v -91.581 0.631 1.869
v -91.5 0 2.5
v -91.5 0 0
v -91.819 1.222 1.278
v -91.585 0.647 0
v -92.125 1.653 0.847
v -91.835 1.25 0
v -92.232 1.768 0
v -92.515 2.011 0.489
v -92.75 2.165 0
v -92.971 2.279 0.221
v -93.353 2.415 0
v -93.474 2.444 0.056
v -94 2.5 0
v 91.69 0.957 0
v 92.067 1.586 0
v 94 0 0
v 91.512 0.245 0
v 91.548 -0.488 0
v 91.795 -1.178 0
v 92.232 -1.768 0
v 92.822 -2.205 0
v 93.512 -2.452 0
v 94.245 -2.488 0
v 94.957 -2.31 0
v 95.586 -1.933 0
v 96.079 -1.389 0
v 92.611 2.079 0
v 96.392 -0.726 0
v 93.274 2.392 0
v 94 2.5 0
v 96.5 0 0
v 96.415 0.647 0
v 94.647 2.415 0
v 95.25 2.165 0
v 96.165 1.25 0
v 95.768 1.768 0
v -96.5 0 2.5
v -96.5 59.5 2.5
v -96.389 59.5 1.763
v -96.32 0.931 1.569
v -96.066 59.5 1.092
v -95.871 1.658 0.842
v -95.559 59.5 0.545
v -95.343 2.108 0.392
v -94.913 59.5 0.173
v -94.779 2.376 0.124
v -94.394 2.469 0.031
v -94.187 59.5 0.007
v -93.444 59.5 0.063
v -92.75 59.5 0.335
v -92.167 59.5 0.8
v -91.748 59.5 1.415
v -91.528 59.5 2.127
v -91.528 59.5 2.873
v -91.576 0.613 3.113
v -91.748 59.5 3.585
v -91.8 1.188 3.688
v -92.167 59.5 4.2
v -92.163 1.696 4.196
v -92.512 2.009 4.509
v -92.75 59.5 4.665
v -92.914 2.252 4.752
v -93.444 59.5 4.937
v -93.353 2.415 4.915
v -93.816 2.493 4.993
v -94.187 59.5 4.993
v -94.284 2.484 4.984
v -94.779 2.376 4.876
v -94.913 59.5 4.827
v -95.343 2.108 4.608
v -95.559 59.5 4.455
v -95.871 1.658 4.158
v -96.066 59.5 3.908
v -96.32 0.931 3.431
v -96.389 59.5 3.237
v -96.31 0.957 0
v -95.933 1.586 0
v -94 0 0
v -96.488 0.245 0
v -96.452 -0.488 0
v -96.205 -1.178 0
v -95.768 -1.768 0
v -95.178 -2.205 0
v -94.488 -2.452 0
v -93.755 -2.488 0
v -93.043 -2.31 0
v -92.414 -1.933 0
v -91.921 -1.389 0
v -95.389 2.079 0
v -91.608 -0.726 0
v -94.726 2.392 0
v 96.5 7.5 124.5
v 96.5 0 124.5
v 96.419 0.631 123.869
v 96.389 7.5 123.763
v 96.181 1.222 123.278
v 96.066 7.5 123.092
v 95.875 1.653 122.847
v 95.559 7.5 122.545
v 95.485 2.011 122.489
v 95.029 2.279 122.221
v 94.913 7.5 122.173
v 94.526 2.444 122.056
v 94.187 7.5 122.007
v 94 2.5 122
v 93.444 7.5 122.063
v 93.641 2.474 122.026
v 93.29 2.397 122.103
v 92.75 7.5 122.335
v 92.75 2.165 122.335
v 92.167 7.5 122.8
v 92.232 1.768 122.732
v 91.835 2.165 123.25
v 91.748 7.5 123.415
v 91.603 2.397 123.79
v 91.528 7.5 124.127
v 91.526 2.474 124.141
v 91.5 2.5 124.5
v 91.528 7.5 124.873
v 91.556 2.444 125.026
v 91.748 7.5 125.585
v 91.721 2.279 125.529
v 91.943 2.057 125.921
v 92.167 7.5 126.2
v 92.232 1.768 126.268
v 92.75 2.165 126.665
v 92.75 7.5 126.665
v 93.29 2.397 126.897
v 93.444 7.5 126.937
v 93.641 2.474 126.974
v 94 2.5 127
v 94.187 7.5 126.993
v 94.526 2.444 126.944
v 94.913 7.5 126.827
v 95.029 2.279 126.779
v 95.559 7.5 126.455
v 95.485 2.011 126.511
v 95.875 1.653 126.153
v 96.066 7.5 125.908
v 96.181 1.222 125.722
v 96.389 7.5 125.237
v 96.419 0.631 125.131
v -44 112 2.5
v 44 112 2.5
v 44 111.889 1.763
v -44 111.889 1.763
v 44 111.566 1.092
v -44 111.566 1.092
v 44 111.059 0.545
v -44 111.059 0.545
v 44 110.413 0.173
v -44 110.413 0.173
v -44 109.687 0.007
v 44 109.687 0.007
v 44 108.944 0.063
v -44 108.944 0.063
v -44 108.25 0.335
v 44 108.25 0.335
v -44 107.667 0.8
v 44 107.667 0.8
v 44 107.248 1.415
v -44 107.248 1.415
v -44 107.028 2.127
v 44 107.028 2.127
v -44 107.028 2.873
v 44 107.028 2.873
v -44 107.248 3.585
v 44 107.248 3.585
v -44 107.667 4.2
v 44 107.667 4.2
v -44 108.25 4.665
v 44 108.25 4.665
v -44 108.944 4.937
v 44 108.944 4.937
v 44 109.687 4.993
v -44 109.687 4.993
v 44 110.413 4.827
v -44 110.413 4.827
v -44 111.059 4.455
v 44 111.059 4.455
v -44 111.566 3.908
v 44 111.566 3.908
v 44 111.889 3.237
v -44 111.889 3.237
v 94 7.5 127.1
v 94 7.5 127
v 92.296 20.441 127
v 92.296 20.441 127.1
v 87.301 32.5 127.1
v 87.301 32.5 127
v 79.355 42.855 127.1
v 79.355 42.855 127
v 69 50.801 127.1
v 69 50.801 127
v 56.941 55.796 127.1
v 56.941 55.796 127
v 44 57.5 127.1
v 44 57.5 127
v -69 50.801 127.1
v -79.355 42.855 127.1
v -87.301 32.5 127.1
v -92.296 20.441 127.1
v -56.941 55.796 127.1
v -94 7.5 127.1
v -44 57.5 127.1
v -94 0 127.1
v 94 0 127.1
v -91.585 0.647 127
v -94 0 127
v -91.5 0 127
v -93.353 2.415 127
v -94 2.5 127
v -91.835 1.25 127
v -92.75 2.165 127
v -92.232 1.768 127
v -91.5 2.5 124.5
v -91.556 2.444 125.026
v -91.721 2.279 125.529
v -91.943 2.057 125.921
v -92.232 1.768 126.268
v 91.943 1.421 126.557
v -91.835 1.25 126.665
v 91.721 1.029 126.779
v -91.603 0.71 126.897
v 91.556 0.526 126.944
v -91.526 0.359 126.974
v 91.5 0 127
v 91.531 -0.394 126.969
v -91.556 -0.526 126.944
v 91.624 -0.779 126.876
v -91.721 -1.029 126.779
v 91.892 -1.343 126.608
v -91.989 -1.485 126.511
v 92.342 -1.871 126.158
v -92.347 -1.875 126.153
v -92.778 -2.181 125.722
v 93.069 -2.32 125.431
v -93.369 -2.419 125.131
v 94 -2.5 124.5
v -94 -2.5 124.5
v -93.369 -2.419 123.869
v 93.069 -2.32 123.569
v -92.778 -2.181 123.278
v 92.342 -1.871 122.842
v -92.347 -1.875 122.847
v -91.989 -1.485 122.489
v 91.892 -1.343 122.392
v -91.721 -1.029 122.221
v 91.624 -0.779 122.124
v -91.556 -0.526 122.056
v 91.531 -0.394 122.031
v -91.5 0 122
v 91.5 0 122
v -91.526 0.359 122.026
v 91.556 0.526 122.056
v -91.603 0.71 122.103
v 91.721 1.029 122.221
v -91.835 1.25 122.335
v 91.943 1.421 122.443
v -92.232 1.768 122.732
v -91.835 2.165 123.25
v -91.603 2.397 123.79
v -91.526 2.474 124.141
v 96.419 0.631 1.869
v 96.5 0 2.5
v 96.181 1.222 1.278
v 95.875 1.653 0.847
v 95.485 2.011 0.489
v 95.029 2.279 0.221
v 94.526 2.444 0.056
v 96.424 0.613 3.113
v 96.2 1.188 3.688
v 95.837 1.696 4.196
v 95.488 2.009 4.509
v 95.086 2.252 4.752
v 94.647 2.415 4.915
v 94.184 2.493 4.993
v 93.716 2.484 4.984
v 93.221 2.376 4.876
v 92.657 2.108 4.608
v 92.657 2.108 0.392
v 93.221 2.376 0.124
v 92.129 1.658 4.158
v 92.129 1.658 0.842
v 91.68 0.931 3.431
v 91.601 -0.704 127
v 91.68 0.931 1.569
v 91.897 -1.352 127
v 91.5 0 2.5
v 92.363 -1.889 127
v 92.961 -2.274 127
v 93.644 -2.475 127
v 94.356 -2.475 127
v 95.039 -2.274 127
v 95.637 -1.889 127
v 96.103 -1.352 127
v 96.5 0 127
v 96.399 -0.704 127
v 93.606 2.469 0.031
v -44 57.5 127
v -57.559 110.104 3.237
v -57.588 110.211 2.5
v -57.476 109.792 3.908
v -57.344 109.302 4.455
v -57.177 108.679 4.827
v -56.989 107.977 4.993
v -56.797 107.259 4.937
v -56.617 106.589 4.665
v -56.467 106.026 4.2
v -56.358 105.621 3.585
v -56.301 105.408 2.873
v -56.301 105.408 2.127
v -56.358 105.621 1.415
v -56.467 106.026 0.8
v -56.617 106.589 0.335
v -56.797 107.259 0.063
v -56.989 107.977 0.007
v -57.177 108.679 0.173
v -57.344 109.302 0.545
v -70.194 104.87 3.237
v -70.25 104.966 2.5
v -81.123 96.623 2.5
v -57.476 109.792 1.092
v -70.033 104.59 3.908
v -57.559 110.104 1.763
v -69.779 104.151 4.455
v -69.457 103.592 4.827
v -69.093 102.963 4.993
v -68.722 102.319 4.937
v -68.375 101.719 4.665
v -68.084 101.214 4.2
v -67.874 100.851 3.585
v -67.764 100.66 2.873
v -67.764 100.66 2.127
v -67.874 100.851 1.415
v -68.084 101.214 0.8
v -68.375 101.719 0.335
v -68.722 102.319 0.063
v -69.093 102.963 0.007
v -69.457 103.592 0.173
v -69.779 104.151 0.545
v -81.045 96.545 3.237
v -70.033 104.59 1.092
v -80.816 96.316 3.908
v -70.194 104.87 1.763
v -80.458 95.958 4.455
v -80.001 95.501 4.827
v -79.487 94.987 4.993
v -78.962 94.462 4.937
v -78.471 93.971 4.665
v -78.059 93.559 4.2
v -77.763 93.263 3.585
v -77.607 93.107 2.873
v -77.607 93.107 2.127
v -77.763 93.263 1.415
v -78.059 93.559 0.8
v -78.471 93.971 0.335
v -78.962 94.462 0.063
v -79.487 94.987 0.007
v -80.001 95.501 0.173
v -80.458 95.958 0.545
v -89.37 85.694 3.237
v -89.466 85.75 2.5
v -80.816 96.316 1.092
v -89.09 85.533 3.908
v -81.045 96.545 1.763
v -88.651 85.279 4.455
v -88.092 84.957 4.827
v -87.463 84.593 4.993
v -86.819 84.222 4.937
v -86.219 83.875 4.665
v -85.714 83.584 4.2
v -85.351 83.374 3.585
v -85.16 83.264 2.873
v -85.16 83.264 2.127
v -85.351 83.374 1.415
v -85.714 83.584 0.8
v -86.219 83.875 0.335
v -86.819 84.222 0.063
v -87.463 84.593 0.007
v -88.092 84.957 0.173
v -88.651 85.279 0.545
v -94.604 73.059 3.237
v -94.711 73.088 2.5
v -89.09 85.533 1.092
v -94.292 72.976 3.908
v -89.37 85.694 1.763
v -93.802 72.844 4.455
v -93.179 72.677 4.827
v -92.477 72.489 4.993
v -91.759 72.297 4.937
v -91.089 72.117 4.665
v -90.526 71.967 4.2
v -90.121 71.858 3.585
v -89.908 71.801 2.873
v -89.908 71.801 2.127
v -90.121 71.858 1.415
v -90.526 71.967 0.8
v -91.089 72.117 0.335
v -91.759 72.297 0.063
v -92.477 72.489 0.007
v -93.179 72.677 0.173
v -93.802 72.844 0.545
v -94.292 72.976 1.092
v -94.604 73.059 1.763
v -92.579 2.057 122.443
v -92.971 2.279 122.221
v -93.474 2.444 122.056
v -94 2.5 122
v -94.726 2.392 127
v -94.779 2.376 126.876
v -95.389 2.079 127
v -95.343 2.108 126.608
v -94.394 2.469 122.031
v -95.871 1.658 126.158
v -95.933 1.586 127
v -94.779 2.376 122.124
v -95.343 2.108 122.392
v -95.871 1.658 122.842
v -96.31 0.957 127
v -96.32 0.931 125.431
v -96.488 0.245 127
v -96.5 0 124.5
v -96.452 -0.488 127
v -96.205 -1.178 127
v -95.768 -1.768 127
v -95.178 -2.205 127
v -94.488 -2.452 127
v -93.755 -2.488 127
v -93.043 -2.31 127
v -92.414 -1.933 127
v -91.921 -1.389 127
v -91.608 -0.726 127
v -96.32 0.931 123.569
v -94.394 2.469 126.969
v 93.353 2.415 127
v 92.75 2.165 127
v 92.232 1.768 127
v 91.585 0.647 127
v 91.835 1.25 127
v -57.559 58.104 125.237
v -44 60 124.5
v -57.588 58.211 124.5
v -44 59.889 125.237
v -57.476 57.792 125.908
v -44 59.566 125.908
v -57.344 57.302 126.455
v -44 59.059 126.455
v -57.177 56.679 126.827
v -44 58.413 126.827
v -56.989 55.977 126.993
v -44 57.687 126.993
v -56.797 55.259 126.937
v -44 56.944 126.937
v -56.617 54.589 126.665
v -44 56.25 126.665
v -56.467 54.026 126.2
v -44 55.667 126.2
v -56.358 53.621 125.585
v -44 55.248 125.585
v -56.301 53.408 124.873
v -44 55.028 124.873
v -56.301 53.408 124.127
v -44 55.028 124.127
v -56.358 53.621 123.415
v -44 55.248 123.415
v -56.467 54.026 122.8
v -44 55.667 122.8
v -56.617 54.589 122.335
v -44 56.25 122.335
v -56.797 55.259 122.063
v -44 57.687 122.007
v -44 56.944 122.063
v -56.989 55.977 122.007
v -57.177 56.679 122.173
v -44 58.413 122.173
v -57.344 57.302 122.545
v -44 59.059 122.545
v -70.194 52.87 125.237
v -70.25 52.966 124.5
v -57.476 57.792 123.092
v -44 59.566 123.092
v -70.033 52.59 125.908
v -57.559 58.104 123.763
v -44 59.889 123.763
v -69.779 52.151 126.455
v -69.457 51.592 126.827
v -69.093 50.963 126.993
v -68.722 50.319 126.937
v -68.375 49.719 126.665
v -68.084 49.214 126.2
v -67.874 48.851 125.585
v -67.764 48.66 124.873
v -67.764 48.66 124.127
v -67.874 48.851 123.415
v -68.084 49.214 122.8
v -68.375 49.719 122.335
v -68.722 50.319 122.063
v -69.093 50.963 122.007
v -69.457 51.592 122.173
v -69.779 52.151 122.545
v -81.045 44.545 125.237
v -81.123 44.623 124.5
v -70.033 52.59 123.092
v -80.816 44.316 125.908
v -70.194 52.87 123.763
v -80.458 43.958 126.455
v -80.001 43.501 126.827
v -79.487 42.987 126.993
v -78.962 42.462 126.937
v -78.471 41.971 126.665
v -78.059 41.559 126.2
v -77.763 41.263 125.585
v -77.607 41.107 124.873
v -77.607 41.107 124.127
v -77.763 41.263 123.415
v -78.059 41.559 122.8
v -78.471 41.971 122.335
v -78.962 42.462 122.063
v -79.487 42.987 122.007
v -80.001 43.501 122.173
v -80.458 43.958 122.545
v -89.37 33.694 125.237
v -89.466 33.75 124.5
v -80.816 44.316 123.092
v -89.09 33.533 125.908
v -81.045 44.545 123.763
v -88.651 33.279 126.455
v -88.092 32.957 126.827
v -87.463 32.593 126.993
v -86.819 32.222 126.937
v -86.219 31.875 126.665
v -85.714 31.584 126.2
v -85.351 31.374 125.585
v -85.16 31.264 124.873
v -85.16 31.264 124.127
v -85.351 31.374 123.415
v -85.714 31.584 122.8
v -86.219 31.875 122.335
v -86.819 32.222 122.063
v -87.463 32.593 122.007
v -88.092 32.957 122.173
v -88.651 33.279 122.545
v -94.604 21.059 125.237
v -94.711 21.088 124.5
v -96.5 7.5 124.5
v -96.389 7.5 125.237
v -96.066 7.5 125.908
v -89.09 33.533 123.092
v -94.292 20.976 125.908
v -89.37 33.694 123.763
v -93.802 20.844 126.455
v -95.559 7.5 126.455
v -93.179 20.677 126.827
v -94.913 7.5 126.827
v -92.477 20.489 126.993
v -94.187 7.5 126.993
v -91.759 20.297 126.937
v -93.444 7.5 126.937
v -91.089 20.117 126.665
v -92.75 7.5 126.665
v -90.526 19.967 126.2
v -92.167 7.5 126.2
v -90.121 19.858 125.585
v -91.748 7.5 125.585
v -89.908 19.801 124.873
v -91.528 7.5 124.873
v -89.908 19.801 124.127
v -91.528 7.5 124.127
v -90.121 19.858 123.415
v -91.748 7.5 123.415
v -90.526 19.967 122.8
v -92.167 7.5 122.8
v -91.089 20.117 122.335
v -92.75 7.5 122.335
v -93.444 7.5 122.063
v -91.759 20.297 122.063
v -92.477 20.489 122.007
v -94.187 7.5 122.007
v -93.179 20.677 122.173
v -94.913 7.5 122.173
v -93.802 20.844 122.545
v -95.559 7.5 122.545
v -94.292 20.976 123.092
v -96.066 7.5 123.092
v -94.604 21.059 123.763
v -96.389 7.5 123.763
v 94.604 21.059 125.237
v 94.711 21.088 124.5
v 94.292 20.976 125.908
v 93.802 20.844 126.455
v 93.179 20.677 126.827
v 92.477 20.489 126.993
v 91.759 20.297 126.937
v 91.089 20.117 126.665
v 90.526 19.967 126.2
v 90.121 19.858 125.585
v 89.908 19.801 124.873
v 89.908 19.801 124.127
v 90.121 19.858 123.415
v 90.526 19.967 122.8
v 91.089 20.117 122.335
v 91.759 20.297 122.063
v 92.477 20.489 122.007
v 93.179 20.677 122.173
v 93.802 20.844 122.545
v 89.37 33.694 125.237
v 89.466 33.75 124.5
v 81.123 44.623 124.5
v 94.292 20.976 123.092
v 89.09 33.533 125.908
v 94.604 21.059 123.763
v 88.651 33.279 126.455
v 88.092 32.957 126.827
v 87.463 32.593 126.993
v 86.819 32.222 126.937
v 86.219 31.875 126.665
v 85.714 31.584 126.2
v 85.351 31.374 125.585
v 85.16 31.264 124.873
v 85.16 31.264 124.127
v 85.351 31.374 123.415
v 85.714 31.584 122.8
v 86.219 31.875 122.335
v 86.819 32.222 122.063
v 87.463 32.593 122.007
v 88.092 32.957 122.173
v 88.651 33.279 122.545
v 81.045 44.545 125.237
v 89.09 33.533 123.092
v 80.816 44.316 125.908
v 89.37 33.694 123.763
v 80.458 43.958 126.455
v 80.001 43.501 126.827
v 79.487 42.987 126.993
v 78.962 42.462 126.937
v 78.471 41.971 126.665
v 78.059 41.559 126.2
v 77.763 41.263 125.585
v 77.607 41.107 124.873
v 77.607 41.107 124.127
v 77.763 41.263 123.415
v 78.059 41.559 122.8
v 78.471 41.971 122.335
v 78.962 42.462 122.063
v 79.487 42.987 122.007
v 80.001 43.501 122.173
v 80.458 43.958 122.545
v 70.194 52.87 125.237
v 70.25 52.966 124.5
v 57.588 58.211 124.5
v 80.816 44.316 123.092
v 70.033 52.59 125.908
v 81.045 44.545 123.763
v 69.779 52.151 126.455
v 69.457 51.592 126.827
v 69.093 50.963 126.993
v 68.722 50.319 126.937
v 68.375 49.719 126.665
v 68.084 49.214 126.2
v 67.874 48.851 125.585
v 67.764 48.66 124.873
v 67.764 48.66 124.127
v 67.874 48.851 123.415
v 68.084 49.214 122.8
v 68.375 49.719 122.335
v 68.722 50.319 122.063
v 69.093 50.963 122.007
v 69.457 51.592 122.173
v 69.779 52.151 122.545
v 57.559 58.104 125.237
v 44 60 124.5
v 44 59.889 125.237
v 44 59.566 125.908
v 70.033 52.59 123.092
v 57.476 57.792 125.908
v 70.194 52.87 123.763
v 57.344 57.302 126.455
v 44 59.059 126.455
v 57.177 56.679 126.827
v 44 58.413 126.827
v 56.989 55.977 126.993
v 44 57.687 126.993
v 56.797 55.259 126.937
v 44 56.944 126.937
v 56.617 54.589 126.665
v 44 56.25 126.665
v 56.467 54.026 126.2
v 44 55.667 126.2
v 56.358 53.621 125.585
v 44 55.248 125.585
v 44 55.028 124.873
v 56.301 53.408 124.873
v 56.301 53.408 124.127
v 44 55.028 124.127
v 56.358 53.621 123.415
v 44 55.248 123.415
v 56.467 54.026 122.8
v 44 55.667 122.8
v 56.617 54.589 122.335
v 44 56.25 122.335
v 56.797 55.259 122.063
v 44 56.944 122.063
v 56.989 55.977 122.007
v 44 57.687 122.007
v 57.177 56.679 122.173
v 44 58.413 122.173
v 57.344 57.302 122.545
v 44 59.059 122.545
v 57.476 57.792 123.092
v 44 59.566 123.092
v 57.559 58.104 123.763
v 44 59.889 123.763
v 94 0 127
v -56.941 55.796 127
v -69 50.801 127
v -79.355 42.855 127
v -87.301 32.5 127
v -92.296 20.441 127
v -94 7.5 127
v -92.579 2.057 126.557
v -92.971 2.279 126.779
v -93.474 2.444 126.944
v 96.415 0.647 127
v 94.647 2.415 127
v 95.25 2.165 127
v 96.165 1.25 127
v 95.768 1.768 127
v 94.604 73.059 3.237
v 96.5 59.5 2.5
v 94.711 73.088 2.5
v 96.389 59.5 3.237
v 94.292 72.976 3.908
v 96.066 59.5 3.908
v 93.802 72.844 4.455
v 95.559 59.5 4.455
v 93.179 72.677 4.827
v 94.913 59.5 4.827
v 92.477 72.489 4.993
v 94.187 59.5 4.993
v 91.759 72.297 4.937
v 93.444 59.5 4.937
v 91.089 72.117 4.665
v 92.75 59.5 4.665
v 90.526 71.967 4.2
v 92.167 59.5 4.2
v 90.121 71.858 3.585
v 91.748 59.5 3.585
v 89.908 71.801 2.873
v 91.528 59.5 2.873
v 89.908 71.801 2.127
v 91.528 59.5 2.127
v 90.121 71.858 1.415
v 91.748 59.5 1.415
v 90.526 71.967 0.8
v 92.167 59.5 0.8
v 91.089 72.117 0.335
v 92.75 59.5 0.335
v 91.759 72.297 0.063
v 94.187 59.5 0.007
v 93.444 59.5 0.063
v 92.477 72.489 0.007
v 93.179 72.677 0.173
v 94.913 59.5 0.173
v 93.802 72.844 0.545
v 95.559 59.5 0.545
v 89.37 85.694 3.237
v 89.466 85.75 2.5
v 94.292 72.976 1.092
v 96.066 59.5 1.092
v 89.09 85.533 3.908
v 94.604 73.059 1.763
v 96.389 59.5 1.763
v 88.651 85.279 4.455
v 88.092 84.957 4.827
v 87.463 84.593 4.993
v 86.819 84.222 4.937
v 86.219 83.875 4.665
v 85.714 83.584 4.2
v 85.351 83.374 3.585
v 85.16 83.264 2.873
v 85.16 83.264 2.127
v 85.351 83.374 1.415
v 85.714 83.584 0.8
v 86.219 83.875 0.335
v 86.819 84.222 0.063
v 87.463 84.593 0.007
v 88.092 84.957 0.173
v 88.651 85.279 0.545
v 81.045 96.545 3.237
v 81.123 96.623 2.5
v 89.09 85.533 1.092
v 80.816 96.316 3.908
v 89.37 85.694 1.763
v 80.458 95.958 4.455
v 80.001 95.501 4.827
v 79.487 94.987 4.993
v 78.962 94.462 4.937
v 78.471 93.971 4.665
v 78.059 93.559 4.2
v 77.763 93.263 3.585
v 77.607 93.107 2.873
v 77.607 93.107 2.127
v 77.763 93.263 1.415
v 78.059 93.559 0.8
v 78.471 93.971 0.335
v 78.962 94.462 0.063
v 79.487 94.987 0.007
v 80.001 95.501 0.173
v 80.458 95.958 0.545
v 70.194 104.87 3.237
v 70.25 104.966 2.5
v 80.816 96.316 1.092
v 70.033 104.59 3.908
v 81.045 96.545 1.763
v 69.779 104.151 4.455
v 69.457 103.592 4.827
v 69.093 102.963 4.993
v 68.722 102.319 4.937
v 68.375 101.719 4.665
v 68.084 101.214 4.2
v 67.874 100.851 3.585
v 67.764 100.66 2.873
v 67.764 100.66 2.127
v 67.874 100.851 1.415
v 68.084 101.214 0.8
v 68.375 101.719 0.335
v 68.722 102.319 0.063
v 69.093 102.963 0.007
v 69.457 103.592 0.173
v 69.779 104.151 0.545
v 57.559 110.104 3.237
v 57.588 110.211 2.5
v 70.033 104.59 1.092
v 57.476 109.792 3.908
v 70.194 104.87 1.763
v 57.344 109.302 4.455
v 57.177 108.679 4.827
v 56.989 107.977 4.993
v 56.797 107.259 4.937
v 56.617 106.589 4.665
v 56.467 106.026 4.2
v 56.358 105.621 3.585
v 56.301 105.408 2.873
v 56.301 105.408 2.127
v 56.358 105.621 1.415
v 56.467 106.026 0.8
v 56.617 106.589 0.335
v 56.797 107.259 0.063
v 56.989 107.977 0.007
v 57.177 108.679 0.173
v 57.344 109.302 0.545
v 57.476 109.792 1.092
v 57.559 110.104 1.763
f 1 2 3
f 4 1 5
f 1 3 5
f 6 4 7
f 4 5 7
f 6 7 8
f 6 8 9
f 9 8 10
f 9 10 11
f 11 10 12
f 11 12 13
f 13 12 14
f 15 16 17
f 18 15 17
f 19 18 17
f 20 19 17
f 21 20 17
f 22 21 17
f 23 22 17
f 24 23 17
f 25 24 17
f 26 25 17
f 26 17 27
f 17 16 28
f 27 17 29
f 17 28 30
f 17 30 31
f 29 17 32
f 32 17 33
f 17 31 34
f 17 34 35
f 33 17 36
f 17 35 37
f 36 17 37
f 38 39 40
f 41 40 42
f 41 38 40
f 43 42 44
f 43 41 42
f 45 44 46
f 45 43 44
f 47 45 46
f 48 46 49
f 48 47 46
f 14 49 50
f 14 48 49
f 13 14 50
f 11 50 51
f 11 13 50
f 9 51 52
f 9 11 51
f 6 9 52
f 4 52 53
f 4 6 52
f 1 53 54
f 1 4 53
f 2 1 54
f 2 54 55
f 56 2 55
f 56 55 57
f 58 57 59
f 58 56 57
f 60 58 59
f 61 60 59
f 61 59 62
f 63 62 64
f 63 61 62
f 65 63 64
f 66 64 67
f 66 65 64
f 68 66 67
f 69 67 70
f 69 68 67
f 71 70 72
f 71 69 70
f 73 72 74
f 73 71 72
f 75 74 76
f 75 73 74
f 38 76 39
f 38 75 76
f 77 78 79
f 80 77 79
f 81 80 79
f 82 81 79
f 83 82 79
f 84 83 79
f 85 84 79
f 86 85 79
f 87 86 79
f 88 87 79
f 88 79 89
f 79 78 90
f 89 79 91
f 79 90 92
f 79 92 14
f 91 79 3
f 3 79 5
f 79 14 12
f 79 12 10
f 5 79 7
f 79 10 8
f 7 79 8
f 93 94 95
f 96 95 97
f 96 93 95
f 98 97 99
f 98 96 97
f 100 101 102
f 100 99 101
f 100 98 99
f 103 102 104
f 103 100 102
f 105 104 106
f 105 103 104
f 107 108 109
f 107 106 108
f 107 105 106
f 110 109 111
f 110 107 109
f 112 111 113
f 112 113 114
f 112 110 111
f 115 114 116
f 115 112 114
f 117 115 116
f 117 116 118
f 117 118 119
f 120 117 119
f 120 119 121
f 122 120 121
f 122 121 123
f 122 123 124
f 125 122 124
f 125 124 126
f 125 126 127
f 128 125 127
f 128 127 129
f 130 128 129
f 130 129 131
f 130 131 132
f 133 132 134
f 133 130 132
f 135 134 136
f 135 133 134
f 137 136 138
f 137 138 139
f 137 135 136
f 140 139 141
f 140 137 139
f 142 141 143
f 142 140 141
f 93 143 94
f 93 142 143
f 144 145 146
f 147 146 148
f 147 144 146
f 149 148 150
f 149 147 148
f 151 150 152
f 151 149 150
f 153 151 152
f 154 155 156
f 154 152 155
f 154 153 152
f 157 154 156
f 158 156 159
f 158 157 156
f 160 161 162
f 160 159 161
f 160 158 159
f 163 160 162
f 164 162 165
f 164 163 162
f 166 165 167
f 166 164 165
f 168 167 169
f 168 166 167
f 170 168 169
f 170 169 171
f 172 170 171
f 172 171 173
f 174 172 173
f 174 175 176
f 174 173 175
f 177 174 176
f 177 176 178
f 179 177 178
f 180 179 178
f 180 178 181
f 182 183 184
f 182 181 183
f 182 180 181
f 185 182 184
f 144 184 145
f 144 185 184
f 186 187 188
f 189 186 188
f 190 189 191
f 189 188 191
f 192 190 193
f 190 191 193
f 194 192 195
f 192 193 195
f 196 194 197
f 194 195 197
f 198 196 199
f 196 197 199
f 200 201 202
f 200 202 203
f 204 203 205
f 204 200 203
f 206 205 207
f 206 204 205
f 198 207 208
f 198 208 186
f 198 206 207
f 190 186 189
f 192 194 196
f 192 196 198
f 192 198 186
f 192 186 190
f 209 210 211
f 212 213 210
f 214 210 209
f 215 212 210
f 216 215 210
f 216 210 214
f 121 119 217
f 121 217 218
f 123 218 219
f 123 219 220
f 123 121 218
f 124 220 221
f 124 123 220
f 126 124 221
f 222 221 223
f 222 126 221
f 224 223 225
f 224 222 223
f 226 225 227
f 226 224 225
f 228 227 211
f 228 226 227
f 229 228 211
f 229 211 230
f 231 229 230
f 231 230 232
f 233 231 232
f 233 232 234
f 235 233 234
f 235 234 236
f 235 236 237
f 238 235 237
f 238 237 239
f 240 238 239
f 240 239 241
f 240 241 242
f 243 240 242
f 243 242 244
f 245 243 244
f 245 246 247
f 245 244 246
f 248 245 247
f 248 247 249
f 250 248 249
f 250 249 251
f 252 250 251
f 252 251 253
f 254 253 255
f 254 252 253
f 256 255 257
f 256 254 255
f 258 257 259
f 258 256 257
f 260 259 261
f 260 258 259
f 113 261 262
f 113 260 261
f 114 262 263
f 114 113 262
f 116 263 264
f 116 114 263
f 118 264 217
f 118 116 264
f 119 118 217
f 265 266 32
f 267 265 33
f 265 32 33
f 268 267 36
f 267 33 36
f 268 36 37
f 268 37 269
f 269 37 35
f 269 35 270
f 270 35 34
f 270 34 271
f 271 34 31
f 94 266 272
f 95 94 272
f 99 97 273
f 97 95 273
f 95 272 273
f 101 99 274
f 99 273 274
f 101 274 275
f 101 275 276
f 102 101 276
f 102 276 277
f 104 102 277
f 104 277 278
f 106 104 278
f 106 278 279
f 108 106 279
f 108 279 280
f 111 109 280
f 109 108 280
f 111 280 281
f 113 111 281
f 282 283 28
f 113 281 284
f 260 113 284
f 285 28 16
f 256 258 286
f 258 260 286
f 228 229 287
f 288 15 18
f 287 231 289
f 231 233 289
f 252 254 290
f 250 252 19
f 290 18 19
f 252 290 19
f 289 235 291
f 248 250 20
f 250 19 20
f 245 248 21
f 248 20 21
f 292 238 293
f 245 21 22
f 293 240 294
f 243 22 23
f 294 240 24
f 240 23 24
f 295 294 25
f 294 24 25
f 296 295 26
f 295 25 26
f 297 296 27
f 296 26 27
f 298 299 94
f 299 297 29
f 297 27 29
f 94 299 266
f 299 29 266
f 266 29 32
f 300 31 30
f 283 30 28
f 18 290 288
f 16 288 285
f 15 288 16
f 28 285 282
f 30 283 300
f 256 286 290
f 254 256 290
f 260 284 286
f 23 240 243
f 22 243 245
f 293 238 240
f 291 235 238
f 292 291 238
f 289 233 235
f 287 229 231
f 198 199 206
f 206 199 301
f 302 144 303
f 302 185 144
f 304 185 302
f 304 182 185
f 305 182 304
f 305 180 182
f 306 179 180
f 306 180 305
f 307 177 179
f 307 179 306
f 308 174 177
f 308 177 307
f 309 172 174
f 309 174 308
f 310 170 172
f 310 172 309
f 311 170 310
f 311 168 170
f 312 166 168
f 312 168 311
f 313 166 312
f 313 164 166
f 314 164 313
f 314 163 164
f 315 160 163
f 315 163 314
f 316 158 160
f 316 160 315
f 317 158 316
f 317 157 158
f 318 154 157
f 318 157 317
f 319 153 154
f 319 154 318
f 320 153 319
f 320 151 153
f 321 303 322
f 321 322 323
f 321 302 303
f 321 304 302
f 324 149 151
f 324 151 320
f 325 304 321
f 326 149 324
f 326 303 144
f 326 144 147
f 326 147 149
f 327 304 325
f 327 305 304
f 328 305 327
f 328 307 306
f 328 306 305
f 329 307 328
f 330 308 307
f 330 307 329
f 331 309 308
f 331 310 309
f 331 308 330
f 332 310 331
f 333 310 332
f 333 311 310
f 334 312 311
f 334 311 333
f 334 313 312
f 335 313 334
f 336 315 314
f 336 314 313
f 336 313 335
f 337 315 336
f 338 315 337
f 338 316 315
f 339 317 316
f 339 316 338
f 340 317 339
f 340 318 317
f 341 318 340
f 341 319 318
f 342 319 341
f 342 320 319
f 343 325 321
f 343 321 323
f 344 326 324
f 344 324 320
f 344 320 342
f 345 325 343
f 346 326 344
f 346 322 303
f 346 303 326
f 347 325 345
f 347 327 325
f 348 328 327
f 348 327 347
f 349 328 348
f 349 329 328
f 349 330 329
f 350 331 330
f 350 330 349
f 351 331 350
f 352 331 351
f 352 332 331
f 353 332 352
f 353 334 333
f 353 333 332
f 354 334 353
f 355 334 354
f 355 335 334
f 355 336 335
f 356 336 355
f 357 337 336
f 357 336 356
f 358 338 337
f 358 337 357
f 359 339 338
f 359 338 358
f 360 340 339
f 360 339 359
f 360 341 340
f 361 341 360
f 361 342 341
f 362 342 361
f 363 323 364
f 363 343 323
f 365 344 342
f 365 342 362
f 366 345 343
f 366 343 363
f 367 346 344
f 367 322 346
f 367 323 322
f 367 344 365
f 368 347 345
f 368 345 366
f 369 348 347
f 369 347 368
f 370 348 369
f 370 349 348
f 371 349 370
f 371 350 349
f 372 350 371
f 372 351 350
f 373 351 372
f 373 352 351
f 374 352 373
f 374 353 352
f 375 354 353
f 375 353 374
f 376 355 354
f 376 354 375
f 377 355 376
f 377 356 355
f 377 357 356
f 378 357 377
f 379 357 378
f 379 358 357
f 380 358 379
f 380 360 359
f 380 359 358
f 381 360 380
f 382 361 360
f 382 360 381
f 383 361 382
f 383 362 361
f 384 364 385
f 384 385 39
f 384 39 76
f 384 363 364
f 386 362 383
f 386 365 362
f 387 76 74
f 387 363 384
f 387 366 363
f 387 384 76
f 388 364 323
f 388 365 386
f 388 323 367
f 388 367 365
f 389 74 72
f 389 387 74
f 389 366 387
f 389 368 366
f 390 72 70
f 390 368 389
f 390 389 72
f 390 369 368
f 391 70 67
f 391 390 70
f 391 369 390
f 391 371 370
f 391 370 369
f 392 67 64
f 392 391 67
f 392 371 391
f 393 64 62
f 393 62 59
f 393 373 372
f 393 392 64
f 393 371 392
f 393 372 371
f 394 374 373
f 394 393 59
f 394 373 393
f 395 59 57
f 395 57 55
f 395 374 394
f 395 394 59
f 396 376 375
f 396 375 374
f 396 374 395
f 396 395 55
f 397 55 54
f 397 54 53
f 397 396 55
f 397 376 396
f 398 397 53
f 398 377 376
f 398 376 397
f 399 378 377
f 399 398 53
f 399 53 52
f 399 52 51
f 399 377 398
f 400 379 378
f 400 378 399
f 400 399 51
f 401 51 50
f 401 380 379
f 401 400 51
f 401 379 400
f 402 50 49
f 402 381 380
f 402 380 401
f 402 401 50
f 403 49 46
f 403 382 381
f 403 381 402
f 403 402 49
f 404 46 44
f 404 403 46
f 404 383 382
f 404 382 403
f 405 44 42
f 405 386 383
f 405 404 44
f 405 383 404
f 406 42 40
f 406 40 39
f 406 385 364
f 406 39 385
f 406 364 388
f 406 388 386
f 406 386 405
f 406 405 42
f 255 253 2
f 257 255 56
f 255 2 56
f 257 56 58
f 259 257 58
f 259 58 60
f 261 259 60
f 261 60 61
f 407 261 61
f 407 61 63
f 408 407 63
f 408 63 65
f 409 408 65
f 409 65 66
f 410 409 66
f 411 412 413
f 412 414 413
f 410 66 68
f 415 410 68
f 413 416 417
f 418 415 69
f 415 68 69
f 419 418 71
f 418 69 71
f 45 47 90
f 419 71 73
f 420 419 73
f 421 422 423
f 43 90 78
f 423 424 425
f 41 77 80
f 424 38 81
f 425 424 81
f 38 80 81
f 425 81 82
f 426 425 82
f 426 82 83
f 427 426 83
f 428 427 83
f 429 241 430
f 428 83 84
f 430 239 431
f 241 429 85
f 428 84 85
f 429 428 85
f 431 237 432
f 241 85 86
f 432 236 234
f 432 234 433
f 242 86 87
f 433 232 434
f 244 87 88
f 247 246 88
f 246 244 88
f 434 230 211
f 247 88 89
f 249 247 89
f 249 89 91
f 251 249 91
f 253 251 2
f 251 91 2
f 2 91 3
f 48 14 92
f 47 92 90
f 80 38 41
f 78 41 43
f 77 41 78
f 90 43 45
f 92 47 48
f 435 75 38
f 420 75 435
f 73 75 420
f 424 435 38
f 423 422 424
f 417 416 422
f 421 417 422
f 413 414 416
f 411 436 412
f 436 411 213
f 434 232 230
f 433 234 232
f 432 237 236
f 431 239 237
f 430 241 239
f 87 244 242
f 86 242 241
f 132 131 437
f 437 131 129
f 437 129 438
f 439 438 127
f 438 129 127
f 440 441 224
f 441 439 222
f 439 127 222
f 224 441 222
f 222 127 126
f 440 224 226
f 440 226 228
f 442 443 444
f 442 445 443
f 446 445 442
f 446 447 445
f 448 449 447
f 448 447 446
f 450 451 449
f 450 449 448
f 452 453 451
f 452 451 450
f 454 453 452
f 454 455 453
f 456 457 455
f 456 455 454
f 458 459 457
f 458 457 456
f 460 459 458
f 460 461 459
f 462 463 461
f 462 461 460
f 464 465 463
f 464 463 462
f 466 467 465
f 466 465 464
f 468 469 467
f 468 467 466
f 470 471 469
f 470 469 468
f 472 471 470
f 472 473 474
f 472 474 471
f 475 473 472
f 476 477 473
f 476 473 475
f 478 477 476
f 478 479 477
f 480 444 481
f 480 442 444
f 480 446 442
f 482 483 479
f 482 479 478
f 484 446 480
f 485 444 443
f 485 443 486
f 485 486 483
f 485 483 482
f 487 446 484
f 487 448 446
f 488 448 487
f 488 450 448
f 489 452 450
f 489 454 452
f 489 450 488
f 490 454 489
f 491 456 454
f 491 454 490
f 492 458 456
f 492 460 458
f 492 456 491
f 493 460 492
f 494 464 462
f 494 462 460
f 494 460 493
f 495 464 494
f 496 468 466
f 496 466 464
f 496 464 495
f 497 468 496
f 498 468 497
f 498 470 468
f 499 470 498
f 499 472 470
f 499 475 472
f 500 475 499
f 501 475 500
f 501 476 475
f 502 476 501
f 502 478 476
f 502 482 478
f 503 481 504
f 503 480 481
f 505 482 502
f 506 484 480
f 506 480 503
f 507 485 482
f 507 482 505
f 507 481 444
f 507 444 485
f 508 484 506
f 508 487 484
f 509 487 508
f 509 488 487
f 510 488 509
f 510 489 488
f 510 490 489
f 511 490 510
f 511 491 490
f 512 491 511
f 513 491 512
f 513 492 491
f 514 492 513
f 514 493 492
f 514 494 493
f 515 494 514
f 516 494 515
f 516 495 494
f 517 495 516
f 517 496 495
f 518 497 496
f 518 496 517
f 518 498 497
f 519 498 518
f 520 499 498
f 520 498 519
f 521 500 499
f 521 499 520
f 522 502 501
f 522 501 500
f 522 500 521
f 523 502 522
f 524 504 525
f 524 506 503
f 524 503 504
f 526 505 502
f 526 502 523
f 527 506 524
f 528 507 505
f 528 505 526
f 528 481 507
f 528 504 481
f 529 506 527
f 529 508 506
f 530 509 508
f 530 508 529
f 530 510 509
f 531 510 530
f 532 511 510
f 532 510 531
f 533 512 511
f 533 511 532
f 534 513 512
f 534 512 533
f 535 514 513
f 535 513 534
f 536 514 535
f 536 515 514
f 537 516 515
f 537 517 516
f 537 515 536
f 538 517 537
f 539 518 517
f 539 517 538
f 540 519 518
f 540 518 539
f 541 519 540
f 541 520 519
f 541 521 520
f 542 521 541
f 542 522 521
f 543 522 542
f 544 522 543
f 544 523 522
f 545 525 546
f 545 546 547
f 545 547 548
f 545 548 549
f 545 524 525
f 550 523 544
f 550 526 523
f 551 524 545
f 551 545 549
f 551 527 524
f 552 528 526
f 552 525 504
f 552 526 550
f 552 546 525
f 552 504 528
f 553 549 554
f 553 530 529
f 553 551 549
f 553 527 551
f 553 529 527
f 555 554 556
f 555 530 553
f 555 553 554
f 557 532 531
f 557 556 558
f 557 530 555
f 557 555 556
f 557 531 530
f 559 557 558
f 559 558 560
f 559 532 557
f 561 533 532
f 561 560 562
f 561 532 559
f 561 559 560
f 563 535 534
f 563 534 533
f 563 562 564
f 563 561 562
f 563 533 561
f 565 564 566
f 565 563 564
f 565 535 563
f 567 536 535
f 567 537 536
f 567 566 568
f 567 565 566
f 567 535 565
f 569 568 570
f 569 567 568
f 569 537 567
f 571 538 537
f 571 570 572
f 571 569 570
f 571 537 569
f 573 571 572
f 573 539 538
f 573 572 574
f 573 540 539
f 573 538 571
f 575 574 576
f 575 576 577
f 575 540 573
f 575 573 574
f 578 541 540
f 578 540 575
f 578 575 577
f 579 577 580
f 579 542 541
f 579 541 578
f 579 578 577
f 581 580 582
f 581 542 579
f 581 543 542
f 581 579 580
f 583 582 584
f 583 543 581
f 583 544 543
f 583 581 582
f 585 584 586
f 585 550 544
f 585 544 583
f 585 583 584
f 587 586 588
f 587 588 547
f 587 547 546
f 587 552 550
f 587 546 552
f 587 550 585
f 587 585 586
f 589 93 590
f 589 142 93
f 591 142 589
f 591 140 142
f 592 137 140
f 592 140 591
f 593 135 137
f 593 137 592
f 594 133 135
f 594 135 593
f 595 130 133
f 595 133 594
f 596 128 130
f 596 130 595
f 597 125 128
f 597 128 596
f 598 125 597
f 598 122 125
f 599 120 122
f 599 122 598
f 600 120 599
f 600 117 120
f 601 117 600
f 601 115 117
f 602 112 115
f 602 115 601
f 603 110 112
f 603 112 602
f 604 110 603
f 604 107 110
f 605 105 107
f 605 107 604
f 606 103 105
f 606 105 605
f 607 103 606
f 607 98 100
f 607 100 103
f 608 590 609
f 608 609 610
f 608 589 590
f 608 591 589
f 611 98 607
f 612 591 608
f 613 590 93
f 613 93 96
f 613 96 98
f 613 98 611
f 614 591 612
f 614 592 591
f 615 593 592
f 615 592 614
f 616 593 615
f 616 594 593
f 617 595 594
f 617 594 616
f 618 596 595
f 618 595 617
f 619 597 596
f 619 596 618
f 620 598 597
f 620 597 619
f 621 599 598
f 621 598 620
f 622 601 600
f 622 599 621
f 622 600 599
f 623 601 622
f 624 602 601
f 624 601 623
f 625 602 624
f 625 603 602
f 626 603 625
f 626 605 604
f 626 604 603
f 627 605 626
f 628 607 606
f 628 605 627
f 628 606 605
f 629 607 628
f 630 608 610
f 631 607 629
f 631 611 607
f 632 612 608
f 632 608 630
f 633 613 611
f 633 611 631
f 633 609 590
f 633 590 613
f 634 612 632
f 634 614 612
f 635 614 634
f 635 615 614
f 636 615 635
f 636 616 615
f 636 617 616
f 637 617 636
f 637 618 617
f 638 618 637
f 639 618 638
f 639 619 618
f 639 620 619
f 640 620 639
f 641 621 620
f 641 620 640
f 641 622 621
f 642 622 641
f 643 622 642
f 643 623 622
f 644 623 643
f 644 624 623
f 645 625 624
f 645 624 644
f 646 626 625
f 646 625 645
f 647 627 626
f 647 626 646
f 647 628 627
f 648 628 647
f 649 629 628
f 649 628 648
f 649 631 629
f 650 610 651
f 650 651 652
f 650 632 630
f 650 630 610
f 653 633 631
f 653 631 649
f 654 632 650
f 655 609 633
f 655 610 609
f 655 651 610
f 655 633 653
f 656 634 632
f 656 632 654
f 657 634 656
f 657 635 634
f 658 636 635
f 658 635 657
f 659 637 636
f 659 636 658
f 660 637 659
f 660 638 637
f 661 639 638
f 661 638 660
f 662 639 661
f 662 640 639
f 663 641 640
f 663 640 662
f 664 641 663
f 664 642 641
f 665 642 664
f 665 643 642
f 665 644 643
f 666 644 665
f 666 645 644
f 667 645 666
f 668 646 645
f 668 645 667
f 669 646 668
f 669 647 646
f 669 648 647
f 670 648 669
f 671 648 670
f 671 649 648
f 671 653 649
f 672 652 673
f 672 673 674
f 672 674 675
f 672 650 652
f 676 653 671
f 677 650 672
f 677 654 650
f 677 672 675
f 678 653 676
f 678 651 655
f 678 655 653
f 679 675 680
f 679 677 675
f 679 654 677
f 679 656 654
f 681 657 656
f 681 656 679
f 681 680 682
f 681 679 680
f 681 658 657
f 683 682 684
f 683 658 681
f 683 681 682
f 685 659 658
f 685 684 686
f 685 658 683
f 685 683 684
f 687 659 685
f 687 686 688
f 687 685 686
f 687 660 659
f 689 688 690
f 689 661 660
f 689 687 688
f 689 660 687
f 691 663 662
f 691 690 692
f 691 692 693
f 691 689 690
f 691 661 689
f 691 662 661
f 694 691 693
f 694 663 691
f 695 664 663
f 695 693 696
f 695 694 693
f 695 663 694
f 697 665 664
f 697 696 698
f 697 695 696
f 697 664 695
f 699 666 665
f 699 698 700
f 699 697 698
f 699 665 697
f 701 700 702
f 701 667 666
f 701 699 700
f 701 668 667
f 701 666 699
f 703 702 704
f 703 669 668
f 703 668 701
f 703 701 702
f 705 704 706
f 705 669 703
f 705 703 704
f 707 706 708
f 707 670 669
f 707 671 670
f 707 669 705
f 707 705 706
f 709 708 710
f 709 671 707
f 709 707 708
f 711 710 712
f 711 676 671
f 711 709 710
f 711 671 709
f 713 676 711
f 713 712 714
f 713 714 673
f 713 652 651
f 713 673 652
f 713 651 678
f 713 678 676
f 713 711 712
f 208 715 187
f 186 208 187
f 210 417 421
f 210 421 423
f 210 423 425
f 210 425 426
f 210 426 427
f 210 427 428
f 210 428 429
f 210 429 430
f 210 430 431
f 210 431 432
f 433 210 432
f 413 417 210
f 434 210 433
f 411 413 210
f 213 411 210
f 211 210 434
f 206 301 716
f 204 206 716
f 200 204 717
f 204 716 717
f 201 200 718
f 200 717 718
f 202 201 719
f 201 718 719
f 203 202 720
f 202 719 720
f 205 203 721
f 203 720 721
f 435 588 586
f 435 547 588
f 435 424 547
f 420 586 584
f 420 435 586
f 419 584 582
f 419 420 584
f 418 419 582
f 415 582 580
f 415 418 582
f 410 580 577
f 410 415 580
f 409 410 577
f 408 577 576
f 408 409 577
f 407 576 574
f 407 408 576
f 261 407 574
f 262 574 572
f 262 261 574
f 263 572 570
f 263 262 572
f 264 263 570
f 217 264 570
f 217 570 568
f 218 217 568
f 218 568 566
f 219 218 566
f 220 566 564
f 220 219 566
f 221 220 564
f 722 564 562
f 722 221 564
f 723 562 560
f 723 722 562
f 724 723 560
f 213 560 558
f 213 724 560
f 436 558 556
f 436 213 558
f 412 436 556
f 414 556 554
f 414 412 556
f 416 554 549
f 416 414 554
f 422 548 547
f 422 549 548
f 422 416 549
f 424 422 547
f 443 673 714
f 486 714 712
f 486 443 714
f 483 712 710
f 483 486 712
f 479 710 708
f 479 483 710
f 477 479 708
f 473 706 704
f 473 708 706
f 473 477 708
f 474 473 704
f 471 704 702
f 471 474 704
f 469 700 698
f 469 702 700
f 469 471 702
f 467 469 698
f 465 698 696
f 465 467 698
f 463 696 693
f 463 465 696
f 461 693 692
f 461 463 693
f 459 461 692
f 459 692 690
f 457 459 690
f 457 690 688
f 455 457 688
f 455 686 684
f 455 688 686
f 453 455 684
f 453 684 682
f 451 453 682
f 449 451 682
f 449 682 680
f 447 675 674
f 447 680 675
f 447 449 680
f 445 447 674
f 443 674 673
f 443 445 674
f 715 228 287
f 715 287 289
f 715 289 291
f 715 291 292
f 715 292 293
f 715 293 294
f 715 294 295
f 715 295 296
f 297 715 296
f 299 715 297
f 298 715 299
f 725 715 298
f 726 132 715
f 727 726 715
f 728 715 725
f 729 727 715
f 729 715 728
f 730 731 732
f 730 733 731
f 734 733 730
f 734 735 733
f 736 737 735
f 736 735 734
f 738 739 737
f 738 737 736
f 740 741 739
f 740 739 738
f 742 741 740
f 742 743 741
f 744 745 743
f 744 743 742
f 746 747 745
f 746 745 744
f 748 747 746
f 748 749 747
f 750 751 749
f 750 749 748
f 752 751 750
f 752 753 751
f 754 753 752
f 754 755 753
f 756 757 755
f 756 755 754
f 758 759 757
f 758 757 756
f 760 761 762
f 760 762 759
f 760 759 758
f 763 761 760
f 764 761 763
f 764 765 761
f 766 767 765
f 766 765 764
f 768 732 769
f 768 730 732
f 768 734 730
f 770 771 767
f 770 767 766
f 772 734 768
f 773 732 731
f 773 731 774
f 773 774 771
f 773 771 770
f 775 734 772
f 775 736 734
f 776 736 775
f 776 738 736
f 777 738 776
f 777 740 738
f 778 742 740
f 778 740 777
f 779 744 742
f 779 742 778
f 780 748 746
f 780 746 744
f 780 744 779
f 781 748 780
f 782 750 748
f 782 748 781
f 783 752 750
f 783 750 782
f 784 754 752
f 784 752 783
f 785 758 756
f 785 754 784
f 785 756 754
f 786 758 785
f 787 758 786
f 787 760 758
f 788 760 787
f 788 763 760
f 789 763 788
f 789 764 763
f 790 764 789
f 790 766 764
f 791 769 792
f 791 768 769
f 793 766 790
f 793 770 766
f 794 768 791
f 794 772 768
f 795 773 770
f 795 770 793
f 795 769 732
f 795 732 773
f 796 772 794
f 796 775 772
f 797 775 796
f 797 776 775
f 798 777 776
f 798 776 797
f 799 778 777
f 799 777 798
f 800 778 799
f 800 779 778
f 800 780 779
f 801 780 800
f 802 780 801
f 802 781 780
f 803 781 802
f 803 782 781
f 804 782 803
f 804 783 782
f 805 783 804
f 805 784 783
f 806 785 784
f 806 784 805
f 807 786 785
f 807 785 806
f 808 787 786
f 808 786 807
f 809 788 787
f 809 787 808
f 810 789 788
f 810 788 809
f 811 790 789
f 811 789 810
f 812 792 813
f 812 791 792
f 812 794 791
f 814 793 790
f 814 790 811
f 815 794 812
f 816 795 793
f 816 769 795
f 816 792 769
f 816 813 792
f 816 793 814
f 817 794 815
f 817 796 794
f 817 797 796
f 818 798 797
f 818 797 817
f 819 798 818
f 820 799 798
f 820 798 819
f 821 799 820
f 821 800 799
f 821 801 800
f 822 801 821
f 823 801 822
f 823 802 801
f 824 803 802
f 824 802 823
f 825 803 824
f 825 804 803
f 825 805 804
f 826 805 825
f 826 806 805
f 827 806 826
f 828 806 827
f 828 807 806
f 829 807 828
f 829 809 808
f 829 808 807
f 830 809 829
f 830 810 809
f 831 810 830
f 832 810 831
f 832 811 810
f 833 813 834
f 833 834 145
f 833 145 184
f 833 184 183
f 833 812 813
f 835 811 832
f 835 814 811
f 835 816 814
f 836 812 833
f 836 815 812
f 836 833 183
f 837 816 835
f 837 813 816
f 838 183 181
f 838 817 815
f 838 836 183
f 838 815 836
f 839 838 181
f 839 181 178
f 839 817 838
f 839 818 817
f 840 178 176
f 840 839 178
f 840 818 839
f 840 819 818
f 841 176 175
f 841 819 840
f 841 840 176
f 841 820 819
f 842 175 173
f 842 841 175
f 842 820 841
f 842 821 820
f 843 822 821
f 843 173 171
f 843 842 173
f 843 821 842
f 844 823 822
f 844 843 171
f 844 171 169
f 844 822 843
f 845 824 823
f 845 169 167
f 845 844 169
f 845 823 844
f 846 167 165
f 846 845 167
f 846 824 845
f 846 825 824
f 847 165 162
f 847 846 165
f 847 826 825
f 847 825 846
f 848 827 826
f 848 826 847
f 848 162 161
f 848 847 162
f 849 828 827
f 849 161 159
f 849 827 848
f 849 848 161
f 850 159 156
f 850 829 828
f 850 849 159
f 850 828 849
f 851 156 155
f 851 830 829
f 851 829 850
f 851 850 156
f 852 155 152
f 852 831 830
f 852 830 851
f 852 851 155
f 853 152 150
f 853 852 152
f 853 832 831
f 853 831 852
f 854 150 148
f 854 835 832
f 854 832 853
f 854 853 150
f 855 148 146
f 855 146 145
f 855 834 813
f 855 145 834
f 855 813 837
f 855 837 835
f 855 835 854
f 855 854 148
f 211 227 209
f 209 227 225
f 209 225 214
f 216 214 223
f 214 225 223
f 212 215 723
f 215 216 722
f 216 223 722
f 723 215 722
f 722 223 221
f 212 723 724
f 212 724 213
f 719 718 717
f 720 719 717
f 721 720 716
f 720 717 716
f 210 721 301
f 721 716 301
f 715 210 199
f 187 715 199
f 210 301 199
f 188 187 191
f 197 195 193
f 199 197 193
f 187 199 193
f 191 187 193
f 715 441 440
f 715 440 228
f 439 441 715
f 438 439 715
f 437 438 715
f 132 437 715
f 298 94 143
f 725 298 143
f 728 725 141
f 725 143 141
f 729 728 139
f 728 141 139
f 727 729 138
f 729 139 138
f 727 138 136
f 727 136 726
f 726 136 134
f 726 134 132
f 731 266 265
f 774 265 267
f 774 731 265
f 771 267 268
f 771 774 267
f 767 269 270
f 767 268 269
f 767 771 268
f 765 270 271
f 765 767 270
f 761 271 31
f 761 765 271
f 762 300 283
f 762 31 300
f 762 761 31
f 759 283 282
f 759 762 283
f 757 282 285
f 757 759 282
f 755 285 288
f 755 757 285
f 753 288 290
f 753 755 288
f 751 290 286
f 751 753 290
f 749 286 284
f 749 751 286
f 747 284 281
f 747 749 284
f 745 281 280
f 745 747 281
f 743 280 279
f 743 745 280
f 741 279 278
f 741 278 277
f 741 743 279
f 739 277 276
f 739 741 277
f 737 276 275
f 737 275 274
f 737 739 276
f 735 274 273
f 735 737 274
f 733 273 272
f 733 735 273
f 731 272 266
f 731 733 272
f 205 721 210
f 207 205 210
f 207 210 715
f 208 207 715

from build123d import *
from build123d import SkipClean  # not in build123d's __all__

# Parameters (mm, degrees)
F0_R      = 2.5
F1_DEPTH  = 127
F5_R      = 2.5
F7_R      = 2.5
F11_R     = 2.5
F20_DEPTH = 0.1


# Not quite as in the source:
# - the program builds the solid bodies; features that only make, move or delete a surface that nothing else refers to are left out


with BuildPart() as f1:
    # F0 (on Top) → F1 (new body)
    with BuildSketch(Plane.XY):
        with Locations((94, 0)):
            Circle(F0_R)
    extrude(amount=F1_DEPTH)



with BuildPart() as f1b:
    # F0 (on Top) → F1, piece 2 (new body)
    with BuildSketch(Plane.XY):
        with Locations((-94, 0)):
            Circle(F0_R)
    extrude(amount=F1_DEPTH)


with BuildPart() as f1_1:
    add(f1.part, clean=False)

    add(f1b.part)  # F6 merges F1b
    # F6: sweep along a path in F3
    with BuildLine(Plane.XY.offset(124.5)) as f6_path:
        Line((-94, 0), (94, 0))
    # F5 (on offset) → F6 (sweep)
    with BuildSketch(Plane.YZ.offset(94)):
        with Locations((0, 124.5)):
            Circle(F5_R)
    sweep(path=f6_path.line)

    # F9: sweep along a path in F8
    with BuildLine(Plane.XY) as f9_path:
        Line((94, 0), (94, 59.5))
        ThreePointArc((94, 59.5), (79.3553390593, 94.8553390593), (44, 109.5))
        Line((44, 109.5), (-44, 109.5))
        ThreePointArc((-44, 109.5), (-79.3553390593, 94.8553390593), (-94, 59.5))
        Line((-94, 59.5), (-94, 0))
    # F7 (on Front) → F9 (sweep)
    with BuildSketch(Plane.XZ):
        with Locations((94, 2.5)):
            Circle(F7_R)
    sweep(path=f9_path.line)

    # F12: sweep along a path in F10
    with BuildLine(Plane.XY.offset(124.5)) as f12_path:
        Line((94, 0), (94, 7.5))
        ThreePointArc((94, 7.5), (79.3553390593, 42.8553390593), (44, 57.5))
        Line((44, 57.5), (-44, 57.5))
        ThreePointArc((-44, 57.5), (-79.3553390593, 42.8553390593), (-94, 7.5))
        Line((-94, 7.5), (-94, 0))
    # F11 (on Front) → F12 (sweep)
    with BuildSketch(Plane.XZ):
        with Locations((94, 124.5)):
            Circle(F11_R)
    with SkipClean():  # cleaning this boolean's faces spoils the solid; the shape is the same uncleaned
        sweep(path=f12_path.line)


with BuildPart() as f20:
    # F19 (on offset) → F20 (new body)
    with BuildSketch(Plane.XY.offset(127)):
        with BuildLine():
            Line((-94, 7.5), (-94, 0))
            Line((-94, 0), (94, 0))
            Line((94, 0), (94, 7.5))
            ThreePointArc((94, 7.5), (79.3553390593, 42.8553390593), (44, 57.5))
            Line((44, 57.5), (-44, 57.5))
            ThreePointArc((-44, 57.5), (-79.3553390593, 42.8553390593), (-94, 7.5))
        make_face()
    extrude(amount=F20_DEPTH)


solid = Compound([f1_1.part, f20.part])
